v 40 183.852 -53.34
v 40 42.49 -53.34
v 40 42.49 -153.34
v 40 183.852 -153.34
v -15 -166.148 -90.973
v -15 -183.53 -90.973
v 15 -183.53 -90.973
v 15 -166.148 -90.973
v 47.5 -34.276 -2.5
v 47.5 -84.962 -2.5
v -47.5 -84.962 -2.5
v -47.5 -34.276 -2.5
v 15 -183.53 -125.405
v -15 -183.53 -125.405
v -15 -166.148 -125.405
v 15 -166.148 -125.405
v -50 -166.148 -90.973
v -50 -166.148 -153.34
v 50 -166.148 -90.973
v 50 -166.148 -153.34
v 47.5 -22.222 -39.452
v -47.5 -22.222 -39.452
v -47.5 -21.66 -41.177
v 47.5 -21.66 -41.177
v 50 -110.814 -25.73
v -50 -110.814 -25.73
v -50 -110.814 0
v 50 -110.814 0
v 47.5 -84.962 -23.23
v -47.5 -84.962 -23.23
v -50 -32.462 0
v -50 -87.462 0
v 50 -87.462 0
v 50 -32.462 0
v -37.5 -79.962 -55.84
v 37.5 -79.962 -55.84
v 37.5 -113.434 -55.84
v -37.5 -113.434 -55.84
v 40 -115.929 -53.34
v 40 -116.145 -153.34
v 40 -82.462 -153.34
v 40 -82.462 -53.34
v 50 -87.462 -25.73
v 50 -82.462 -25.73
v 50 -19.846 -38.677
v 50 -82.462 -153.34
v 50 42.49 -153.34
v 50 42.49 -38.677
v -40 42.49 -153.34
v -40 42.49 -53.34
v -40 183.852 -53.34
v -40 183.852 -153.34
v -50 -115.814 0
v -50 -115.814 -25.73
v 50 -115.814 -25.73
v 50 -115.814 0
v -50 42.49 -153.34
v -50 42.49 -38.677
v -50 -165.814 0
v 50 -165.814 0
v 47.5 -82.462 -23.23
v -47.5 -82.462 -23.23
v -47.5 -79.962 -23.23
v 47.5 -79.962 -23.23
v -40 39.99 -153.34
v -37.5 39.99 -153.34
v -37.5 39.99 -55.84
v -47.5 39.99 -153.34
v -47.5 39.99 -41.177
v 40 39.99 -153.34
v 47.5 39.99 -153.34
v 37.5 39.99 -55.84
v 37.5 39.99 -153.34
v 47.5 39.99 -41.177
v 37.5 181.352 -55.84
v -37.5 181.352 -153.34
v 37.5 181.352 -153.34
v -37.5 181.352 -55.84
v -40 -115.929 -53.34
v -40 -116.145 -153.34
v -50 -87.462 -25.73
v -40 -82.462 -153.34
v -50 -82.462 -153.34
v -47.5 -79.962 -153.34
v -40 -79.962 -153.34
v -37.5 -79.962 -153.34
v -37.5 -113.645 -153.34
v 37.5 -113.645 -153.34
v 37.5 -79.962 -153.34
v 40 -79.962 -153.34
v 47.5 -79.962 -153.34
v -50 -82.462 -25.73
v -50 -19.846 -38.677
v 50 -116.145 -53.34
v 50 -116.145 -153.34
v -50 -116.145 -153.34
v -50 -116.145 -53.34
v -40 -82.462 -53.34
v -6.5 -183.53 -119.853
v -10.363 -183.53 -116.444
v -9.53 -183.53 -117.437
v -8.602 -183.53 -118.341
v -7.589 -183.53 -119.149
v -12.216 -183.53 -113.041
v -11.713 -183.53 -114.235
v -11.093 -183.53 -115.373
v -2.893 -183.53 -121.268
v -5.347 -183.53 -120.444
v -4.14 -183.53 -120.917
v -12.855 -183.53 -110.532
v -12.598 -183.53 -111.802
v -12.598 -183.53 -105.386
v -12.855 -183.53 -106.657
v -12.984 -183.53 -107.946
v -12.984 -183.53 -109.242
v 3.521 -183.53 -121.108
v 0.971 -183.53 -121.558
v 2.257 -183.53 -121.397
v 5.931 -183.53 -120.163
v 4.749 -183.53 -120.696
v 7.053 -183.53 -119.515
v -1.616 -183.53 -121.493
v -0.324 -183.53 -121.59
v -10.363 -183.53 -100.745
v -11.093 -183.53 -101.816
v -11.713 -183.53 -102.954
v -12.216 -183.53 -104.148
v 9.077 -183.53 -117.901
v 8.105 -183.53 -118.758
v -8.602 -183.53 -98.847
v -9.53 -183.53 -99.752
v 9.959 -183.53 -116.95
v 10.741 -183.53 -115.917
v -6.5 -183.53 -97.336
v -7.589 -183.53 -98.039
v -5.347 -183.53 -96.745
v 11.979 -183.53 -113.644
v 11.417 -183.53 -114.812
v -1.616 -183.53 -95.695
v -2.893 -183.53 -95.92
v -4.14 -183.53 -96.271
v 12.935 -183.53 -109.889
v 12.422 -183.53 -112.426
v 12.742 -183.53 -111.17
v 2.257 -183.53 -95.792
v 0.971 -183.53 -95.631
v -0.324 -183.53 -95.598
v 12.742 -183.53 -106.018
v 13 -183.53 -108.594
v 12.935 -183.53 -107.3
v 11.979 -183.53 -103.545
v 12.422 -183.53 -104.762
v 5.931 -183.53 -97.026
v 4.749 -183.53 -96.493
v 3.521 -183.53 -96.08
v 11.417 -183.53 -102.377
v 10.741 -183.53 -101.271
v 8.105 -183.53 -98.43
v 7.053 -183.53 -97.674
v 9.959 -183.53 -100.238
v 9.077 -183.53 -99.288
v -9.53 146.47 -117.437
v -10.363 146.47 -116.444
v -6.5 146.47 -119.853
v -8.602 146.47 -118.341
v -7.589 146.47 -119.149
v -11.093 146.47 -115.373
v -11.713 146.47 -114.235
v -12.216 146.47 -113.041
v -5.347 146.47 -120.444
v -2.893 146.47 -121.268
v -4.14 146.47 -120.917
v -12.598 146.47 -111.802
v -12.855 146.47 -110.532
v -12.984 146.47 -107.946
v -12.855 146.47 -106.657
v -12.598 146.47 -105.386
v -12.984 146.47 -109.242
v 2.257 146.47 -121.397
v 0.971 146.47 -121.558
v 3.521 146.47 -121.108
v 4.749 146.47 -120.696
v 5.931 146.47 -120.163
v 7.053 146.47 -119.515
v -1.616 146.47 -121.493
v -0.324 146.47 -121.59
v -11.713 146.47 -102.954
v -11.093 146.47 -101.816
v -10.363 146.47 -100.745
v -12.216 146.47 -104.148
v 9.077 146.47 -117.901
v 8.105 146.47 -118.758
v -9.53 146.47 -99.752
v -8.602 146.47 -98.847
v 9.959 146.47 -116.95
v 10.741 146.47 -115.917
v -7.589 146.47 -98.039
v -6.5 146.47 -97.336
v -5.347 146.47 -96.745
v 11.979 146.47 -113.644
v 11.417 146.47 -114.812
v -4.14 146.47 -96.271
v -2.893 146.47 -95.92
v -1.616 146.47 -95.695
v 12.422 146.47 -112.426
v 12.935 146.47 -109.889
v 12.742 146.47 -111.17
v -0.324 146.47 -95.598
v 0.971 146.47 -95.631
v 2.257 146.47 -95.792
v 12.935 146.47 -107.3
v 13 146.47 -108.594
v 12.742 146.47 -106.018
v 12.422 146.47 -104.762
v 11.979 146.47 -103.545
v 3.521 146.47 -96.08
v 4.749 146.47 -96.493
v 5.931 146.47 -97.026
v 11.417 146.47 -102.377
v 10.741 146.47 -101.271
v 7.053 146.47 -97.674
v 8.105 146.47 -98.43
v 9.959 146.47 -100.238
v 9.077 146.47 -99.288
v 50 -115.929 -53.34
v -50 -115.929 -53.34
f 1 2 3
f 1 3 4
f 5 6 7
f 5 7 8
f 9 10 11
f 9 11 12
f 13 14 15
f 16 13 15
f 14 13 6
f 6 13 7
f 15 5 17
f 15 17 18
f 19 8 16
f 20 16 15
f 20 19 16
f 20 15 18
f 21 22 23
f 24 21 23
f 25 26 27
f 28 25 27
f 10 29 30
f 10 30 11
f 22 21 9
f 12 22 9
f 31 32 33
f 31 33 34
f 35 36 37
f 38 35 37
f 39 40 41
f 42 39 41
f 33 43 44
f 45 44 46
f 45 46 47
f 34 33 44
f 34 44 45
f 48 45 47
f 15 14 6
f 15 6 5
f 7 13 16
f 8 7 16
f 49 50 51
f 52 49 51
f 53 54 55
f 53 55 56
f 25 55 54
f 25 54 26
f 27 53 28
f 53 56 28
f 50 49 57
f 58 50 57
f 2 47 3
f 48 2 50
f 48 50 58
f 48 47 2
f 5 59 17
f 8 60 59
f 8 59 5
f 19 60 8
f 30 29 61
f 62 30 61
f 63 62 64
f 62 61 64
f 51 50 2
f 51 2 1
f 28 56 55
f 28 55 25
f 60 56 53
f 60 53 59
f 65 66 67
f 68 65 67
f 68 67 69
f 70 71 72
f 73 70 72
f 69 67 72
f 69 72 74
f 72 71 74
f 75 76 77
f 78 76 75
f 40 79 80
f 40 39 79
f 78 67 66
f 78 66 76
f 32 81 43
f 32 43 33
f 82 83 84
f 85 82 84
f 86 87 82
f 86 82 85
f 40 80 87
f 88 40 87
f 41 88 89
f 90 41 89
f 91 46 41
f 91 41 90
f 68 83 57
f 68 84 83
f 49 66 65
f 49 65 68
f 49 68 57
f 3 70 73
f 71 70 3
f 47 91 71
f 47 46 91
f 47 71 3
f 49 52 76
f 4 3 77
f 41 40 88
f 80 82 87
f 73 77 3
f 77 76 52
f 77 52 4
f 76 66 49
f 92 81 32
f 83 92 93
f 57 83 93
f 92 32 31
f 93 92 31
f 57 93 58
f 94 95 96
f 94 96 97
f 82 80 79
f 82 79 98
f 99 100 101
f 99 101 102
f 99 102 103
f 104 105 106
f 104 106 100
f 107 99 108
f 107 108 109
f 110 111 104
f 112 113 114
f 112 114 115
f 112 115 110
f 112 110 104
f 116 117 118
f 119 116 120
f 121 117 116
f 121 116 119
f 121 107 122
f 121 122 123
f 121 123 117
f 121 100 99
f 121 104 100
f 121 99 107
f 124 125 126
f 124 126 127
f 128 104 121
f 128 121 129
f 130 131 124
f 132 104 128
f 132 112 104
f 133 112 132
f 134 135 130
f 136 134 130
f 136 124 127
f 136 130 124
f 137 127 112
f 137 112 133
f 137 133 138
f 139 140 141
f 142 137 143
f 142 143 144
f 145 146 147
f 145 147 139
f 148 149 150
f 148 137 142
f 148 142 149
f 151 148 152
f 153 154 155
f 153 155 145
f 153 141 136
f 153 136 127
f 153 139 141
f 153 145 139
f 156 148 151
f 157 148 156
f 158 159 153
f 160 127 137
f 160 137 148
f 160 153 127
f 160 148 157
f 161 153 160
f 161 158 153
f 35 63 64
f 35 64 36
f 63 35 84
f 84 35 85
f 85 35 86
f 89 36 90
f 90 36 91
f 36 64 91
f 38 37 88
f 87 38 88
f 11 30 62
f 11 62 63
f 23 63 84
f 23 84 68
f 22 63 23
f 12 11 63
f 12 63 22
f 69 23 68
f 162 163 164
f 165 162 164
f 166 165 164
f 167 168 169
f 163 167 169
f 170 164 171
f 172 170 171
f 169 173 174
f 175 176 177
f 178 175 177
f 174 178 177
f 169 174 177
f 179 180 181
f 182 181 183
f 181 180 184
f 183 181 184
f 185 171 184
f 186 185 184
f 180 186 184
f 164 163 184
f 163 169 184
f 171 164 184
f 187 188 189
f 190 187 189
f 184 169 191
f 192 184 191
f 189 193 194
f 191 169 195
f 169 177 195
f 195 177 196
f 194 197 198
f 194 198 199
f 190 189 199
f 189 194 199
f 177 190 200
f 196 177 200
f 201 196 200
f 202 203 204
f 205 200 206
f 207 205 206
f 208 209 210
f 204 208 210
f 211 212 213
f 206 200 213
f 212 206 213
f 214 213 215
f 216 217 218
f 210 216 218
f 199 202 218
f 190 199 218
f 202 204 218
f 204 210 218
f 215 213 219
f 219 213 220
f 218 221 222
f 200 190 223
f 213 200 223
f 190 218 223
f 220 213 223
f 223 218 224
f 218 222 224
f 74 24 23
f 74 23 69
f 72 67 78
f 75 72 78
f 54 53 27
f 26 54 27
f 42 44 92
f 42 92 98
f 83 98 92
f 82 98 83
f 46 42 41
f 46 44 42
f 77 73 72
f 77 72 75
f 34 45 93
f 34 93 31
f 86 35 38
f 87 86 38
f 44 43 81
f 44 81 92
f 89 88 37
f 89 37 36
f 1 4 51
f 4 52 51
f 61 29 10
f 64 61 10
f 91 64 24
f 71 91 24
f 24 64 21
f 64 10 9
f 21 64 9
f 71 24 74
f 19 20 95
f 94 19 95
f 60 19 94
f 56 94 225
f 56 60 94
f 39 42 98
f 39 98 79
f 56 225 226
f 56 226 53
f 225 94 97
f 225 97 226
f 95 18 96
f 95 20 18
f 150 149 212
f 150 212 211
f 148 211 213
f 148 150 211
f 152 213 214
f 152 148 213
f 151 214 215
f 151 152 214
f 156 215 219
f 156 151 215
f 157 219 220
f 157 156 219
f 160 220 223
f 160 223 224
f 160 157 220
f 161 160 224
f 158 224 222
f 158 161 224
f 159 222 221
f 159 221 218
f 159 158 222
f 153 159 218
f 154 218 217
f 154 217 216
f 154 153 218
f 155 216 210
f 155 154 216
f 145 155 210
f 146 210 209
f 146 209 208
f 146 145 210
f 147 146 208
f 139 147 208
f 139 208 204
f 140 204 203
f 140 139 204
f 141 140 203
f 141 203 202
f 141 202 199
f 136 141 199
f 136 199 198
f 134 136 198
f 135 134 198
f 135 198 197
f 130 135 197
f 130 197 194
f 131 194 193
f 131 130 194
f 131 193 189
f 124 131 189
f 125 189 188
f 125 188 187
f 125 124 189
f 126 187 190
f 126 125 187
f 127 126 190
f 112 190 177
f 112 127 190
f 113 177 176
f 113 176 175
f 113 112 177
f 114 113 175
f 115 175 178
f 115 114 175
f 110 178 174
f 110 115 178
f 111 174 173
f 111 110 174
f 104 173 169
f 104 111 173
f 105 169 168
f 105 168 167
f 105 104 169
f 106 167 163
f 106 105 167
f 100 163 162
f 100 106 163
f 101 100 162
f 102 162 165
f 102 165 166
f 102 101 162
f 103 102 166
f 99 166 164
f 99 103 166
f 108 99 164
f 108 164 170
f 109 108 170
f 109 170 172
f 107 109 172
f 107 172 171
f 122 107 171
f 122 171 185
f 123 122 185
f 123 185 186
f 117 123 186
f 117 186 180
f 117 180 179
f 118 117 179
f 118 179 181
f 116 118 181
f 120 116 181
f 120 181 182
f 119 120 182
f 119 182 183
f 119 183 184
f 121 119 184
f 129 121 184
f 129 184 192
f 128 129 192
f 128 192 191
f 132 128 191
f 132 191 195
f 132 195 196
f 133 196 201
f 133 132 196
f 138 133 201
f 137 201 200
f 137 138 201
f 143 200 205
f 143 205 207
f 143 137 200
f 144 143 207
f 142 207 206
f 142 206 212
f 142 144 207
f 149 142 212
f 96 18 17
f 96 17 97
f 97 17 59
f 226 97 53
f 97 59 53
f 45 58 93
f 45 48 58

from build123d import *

# Parameters (mm, degrees)
F0_W        = 124.9519532199
F0_H        = 100
F1_DEPTH    = 50
F0_W_2      = 141.3618674554
F2_DEPTH    = 40
F0_W_3      = 5
F0_H_2      = 25.7300529629
F3_DEPTH    = 50
F4_DEPTH    = 50
F0_W_4      = 17.3817112001
F0_H_3      = 34.4321173714
F5_DEPTH    = 15
F6_T        = 2.5
F6_T3_DEPTH = 105
F6_T5_DEPTH = 105
F6_T7_DEPTH = 85
F7_R        = 13
F8_DEPTH    = 330


# Not quite as in the source:
# - a shell that OpenCascade refuses in one call is made with other operations: the cavity is built on its own and cut out


with BuildPart() as f1:
    # F0 (on Right) → F1 (new body, symmetric)
    with BuildSketch(Plane.YZ):
        Polygon((-82.4616801739, -53.3395072201), (42.490273046, -53.3395072201), (42.490273046, -38.6770403606), (0, -38.6770403606), (-19.8455593103, -38.6770403606), (-32.4616801739, 0), (-77.4616801739, 0), (-82.4616801739, 0), (-82.4616801739, -25.7300529629), align=None)
        with Locations((-19.9857035639, -103.3395072201)):
            Rectangle(F0_W, F0_H)
    extrude(amount=F1_DEPTH, both=True)

    # F0 (on Right) → F2 (join, symmetric)
    with BuildSketch(Plane.YZ):
        with Locations((113.1712067737, -103.3395072201)):
            Rectangle(F0_W_2, F0_H)
        Polygon((-116.1451248146, -153.3395072201), (-82.4616801739, -153.3395072201), (-82.4616801739, -53.3395072201), (-115.929015638, -53.3395072201), align=None)
    extrude(amount=F2_DEPTH, both=True)

    # F0 (on Right) → F3, piece 2 (join, symmetric)
    with BuildSketch(Plane.YZ):
        Polygon((-82.4616801739, -53.3395072201), (42.490273046, -53.3395072201), (42.490273046, -38.6770403606), (0, -38.6770403606), (-19.8455593103, -38.6770403606), (-32.4616801739, 0), (-77.4616801739, 0), (-82.4616801739, 0), (-82.4616801739, -25.7300529629), align=None)
    extrude(amount=F3_DEPTH, both=True)

    # F0 (on Right) → F4 (join, symmetric)
    with BuildSketch(Plane.YZ):
        with Locations((-84.9616801739, -12.8650264814)):
            Rectangle(F0_W_3, F0_H_2)
    extrude(amount=F4_DEPTH, both=True)

    # F6: shell of thickness 2.5, made by hand


with BuildPart() as f1b:
    # F0 (on Right) → F1, piece 2 (new body, symmetric)
    with BuildSketch(Plane.YZ):
        Polygon((-166.1478594986, -153.3395072201), (-116.1451248146, -153.3395072201), (-116.1451248146, -53.3395072201), (-115.929015638, -53.3395072201), (-115.8137440681, 0), (-165.8137440681, 0), (-166.1478594986, -90.9727620794), (-166.1478594986, -125.4048794508), align=None)
    extrude(amount=F1_DEPTH, both=True)

    # F0 (on Right) → F5 (join, symmetric)
    with BuildSketch(Plane.YZ):
        with Locations((-174.8387150987, -108.1888207651)):
            Rectangle(F0_W_4, F0_H_3)
    extrude(amount=F5_DEPTH, both=True)


with BuildPart() as f3:
    # F0 (on Right) → F3 (new body, symmetric)
    with BuildSketch(Plane.YZ):
        with Locations((-113.3137440681, -12.8650264814)):
            Rectangle(F0_W_3, F0_H_2)
    extrude(amount=F3_DEPTH, both=True)


with BuildPart() as f6_core1:
    # F6_t2: copy of F1
    add(f1.part)

    # the walls: a layer under each face that stays
    f6_faces = [f6_core1.faces().sort_by_distance(p)[0] for p in [
        (-33.3333333333, -82.4616801739, -46.9982953391),
        (-50, -22.4857035639, -76.66975361),
        (0, -87.4616801739, -12.8650264814),
        (0, -59.9616801739, 0),
        (0, -26.1536197421, -19.3385201803),
        (0, 11.3223568678, -38.6770403606),
        (-42.8571428571, 42.490273046, -145.1493310158),
        (40, 113.1712067737, -103.3395072201),
        (0, 183.8521405014, -103.3395072201),
        (-40, 113.1712067737, -103.3395072201),
        (0, 113.1712067737, -53.3395072201),
        (-40, -99.3034024943, -103.3395072201),
        (0, -116.0370702263, -103.3395072201),
        (0, -99.1953479059, -53.3395072201),
        (40, -99.3034024943, -103.3395072201),
        (50, -22.4857035639, -76.66975361),
        (0, -84.9616801739, -25.7300529629),
    ]]
    thicken(f6_faces, amount=-F6_T, mode=Mode.SUBTRACT)

    # F6_s4 → F6_t3 (cut)
    with BuildSketch(Plane.YZ.offset(-52.5)):
        Polygon((-82.4866801739, -25.7550529629), (-79.9616801739, -25.7300529629), (-79.9616801739, -23.2300529629), (-82.4616801739, -23.2300529629), align=None)
        Polygon((-19.8217917967, -38.6442876003), (-22.222310679, -39.4523163965), (-21.6597204242, -41.1770403606), (-19.8455593103, -41.1770403606), align=None)
    extrude(amount=F6_T3_DEPTH, mode=Mode.SUBTRACT)

    # F6_s6 → F6_t5 (cut)
    with BuildSketch(Plane.XY.offset(-155.8395072201)):
        Polygon((40.025, -82.4866801739), (40, -79.9616801739), (37.5, -79.9616801739), (37.5, -82.4616801739), align=None)
        Polygon((-40.025, -82.4866801739), (-40, -79.9616801739), (-37.5, -79.9616801739), (-37.5, -82.4616801739), align=None)
        Polygon((-40.025, 42.515273046), (-40, 39.990273046), (-37.5, 39.990273046), (-37.5, 42.490273046), align=None)
        Polygon((40.025, 42.515273046), (40, 39.990273046), (37.5, 39.990273046), (37.5, 42.490273046), align=None)
    extrude(amount=F6_T5_DEPTH, mode=Mode.SUBTRACT)

    # F6_s8 → F6_t7 (cut)
    with BuildSketch(Plane.YZ.offset(-42.5)):
        Polygon((-82.4866801739, -53.3145072201), (-79.9616801739, -53.3395072201), (-79.9616801739, -55.8395072201), (-82.4616801739, -55.8395072201), align=None)
        Polygon((42.515273046, -53.3145072201), (39.990273046, -53.3395072201), (39.990273046, -55.8395072201), (42.490273046, -55.8395072201), align=None)
    extrude(amount=F6_T7_DEPTH, mode=Mode.SUBTRACT)


with BuildPart() as f1_1:
    add(f1.part)

    # what is left inside the walls is the cavity
    f6_cavity = [f6_core1.part.solids().sort_by_distance(p)[0] for p in [
        (-15.833333, 33.853511, -153.314507),
    ]]
    add(f6_cavity, mode=Mode.SUBTRACT)


with BuildPart() as f8:
    # F7 (on face) → F8 (new body)
    with BuildSketch(Plane.XZ.offset(183.5295706987)):
        with Locations((0, -108.5942578374)):
            Circle(F7_R)
    extrude(amount=-F8_DEPTH)


solid = Compound([f1b.part, f3.part, f1_1.part, f8.part])
